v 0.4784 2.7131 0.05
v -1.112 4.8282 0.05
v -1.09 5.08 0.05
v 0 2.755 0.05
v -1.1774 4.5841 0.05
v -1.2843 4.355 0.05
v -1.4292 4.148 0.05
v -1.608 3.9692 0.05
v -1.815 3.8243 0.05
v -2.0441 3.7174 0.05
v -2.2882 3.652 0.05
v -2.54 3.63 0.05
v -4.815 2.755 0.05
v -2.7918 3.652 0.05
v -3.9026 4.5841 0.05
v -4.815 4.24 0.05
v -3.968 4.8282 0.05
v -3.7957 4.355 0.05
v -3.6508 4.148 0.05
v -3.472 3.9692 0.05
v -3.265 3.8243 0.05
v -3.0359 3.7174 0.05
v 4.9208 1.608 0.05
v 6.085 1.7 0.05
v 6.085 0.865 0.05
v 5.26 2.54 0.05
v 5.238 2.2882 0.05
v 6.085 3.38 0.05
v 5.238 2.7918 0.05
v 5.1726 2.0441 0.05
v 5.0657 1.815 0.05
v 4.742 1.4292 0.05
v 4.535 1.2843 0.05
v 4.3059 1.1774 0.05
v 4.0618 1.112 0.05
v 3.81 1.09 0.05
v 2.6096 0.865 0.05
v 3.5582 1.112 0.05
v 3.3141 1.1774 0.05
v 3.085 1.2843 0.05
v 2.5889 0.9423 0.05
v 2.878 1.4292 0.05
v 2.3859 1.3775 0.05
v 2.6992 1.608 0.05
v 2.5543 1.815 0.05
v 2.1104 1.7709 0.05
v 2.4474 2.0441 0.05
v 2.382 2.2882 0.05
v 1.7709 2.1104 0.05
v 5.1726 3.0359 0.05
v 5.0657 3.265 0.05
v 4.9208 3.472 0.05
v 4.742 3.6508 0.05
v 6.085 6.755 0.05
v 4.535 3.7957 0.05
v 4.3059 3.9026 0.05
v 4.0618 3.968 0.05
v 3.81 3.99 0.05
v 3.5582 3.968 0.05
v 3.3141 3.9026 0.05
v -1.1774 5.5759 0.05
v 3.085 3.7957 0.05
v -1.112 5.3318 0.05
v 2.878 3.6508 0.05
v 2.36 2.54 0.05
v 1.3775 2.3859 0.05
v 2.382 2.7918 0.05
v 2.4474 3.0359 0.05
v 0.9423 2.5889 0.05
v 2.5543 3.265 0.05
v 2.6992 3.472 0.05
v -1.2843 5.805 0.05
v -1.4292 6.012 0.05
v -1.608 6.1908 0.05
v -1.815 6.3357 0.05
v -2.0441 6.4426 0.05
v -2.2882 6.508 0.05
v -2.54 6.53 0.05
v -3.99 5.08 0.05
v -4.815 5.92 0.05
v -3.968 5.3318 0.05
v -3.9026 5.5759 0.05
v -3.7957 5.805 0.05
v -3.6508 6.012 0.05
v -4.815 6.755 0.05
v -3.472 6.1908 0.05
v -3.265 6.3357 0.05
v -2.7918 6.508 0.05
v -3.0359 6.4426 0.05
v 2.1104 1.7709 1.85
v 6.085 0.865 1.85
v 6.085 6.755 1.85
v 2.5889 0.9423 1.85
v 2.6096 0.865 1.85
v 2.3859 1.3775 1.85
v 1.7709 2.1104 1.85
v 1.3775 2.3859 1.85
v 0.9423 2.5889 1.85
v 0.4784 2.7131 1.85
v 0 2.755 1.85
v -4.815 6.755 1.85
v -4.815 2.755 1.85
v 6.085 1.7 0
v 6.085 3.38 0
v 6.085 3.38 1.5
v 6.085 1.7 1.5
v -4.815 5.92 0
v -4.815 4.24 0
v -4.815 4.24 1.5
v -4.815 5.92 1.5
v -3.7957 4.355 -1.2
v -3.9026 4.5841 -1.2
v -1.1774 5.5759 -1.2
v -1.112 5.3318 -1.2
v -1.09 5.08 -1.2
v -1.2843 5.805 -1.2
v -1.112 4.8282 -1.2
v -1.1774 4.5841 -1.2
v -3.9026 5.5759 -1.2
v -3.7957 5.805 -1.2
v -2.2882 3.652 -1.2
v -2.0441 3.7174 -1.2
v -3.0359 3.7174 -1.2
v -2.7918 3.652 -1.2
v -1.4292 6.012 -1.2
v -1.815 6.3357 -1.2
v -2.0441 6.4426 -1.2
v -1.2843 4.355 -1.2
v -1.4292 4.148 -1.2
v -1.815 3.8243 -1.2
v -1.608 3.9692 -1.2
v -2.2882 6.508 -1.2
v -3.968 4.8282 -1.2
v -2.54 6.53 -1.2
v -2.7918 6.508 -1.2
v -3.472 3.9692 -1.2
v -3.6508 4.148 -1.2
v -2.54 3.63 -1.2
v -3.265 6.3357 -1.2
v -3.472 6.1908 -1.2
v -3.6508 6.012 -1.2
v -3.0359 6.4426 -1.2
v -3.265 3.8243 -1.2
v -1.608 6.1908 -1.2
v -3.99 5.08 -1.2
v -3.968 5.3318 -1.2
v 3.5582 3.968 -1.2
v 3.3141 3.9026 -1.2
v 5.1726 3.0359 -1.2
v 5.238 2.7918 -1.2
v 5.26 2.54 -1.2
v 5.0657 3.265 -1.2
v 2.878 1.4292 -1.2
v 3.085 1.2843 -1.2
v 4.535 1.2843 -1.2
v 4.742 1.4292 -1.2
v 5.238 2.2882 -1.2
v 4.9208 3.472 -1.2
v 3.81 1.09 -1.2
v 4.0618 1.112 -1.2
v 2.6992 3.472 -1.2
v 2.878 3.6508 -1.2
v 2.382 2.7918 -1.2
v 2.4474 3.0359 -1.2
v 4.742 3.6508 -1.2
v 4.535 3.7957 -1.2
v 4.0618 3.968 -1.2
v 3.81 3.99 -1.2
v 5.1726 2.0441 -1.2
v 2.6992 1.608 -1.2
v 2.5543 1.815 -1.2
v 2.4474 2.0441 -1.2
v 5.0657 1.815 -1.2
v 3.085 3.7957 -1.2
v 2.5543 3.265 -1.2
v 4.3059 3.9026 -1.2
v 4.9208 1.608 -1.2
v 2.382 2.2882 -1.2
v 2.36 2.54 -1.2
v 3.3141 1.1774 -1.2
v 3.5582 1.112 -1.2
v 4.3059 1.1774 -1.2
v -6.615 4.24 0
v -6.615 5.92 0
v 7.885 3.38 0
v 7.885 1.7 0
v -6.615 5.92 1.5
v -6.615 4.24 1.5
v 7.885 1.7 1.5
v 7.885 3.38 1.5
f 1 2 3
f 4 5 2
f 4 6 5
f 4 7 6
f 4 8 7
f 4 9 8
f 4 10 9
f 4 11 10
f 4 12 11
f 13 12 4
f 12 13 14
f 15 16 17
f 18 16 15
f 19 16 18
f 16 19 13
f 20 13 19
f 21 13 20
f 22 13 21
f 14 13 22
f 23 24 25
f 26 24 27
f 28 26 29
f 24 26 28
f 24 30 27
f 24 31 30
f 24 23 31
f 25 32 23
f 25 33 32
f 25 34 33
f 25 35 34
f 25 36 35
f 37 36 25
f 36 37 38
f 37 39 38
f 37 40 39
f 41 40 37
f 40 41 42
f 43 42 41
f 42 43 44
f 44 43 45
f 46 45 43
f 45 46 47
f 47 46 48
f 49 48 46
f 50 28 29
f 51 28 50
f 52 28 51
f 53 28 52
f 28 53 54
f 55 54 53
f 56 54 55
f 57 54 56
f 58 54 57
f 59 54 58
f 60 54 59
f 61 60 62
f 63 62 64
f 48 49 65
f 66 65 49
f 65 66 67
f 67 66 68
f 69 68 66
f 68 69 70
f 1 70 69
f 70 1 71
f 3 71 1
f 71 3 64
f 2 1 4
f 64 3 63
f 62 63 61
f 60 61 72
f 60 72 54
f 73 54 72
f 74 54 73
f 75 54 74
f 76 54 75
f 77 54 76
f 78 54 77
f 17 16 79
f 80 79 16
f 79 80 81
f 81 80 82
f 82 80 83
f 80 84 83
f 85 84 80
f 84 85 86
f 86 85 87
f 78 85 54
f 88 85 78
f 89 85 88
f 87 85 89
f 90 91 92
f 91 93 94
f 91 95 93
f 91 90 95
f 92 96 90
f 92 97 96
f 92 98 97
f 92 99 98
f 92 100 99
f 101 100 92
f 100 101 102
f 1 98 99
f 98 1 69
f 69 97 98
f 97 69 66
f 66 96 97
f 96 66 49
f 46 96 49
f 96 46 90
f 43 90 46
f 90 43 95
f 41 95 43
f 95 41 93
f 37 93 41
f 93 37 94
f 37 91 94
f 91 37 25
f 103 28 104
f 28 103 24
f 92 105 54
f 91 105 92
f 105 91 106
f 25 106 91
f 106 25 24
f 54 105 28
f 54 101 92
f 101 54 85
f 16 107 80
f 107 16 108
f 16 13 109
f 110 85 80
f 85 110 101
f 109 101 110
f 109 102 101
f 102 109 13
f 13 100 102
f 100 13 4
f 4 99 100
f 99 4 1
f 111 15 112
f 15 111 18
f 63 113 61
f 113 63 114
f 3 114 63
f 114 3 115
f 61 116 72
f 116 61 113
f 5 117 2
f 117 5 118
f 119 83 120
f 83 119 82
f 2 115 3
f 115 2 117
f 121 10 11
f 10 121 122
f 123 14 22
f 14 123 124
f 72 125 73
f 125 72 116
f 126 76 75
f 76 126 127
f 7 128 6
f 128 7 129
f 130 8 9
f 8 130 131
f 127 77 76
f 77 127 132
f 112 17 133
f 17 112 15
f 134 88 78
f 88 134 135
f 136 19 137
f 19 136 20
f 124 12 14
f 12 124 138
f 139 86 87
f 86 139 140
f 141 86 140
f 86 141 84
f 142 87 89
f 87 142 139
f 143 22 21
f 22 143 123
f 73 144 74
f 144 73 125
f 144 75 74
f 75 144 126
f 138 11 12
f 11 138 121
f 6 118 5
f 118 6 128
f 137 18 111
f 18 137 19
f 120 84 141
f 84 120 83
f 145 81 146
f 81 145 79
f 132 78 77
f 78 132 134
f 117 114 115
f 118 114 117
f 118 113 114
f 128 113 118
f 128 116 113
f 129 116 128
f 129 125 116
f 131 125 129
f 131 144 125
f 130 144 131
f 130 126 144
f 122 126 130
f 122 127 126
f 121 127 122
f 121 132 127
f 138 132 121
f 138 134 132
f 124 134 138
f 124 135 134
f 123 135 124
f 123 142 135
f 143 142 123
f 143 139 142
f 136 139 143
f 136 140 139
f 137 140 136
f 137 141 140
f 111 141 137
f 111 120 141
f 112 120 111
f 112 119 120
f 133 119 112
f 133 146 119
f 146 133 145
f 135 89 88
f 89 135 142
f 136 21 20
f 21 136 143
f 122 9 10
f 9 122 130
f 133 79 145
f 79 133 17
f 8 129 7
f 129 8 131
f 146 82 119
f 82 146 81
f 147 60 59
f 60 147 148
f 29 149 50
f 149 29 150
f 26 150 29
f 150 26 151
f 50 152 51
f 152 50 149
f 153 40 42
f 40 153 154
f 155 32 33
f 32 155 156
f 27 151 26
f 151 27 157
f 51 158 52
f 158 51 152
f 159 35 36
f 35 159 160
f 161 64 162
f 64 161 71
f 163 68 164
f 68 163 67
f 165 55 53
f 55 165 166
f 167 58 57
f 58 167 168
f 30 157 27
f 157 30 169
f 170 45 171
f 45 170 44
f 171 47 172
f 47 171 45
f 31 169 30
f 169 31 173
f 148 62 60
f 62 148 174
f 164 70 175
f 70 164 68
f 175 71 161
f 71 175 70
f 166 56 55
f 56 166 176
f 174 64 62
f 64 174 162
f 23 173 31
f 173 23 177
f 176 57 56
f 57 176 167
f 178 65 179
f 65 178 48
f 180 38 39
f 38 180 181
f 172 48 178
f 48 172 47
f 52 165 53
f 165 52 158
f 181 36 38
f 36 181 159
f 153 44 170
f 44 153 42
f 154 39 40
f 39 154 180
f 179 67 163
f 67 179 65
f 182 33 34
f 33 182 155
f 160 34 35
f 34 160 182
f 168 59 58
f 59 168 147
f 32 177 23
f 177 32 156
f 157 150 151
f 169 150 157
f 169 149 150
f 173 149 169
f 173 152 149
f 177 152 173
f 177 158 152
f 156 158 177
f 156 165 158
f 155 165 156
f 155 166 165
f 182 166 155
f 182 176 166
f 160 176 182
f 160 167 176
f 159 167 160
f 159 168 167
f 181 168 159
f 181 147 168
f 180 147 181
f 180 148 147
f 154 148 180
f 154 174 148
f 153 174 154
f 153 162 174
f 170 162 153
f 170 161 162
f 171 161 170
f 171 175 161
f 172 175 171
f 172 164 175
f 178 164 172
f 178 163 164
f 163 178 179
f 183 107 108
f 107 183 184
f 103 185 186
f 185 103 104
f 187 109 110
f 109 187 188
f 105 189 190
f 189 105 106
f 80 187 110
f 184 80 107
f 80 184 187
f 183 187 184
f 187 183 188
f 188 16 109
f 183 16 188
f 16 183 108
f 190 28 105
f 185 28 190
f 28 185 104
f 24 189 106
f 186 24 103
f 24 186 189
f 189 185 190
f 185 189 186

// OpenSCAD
// Hot swap socket
//
// This designed so that the center pin of MX compatible keyboard switches is centered.
// Also, this is a simplified model and details are omitted.

cx = (1.27*3 - 1.27*2)/2;
cy = 1.27*3;

color("beige") translate([0,0,0.05]) {
    linear_extrude(1.80) {
        difference() {
            translate([cx,cy]) {
                square(size=[10.90,5.89], center=true);
            }
            
            gap = 5.89 - 4;
            translate([cx-10.90/2,cy-(5.89/2)]) {
                square(size=[10.90/2-cx,gap]);
            }

            // Calculate from the center pin of the key switch
            circle(r=cy-(5.89/2)+gap, $fn=36);
        }
    }

    translate([-1.27*2,1.27*4,-(3.05-1.80)]) {
        // d±0.05
        cylinder(d=2.9, h=3.05-1.80, $fn=36);
    }
    
    translate([1.27*3,1.27*2,-(3.05-1.80)]) {
        // d±0.05
        cylinder(d=2.9, h=3.05-1.80, $fn=36);
    }
}

color("silver") linear_extrude(1.5) {
    //pad_min_margin = 11.30;
    pad_min_margin = 10.90;
    pad_len = (14.50 - pad_min_margin)/2;
    
    translate([cx-pad_min_margin/2-pad_len/2,1.27*4]) {
        square([pad_len,1.68], center=true);
    }
    
    translate([cx+pad_min_margin/2+pad_len/2,1.27*2]) {
        square([pad_len,1.68], center=true);
    }
}
